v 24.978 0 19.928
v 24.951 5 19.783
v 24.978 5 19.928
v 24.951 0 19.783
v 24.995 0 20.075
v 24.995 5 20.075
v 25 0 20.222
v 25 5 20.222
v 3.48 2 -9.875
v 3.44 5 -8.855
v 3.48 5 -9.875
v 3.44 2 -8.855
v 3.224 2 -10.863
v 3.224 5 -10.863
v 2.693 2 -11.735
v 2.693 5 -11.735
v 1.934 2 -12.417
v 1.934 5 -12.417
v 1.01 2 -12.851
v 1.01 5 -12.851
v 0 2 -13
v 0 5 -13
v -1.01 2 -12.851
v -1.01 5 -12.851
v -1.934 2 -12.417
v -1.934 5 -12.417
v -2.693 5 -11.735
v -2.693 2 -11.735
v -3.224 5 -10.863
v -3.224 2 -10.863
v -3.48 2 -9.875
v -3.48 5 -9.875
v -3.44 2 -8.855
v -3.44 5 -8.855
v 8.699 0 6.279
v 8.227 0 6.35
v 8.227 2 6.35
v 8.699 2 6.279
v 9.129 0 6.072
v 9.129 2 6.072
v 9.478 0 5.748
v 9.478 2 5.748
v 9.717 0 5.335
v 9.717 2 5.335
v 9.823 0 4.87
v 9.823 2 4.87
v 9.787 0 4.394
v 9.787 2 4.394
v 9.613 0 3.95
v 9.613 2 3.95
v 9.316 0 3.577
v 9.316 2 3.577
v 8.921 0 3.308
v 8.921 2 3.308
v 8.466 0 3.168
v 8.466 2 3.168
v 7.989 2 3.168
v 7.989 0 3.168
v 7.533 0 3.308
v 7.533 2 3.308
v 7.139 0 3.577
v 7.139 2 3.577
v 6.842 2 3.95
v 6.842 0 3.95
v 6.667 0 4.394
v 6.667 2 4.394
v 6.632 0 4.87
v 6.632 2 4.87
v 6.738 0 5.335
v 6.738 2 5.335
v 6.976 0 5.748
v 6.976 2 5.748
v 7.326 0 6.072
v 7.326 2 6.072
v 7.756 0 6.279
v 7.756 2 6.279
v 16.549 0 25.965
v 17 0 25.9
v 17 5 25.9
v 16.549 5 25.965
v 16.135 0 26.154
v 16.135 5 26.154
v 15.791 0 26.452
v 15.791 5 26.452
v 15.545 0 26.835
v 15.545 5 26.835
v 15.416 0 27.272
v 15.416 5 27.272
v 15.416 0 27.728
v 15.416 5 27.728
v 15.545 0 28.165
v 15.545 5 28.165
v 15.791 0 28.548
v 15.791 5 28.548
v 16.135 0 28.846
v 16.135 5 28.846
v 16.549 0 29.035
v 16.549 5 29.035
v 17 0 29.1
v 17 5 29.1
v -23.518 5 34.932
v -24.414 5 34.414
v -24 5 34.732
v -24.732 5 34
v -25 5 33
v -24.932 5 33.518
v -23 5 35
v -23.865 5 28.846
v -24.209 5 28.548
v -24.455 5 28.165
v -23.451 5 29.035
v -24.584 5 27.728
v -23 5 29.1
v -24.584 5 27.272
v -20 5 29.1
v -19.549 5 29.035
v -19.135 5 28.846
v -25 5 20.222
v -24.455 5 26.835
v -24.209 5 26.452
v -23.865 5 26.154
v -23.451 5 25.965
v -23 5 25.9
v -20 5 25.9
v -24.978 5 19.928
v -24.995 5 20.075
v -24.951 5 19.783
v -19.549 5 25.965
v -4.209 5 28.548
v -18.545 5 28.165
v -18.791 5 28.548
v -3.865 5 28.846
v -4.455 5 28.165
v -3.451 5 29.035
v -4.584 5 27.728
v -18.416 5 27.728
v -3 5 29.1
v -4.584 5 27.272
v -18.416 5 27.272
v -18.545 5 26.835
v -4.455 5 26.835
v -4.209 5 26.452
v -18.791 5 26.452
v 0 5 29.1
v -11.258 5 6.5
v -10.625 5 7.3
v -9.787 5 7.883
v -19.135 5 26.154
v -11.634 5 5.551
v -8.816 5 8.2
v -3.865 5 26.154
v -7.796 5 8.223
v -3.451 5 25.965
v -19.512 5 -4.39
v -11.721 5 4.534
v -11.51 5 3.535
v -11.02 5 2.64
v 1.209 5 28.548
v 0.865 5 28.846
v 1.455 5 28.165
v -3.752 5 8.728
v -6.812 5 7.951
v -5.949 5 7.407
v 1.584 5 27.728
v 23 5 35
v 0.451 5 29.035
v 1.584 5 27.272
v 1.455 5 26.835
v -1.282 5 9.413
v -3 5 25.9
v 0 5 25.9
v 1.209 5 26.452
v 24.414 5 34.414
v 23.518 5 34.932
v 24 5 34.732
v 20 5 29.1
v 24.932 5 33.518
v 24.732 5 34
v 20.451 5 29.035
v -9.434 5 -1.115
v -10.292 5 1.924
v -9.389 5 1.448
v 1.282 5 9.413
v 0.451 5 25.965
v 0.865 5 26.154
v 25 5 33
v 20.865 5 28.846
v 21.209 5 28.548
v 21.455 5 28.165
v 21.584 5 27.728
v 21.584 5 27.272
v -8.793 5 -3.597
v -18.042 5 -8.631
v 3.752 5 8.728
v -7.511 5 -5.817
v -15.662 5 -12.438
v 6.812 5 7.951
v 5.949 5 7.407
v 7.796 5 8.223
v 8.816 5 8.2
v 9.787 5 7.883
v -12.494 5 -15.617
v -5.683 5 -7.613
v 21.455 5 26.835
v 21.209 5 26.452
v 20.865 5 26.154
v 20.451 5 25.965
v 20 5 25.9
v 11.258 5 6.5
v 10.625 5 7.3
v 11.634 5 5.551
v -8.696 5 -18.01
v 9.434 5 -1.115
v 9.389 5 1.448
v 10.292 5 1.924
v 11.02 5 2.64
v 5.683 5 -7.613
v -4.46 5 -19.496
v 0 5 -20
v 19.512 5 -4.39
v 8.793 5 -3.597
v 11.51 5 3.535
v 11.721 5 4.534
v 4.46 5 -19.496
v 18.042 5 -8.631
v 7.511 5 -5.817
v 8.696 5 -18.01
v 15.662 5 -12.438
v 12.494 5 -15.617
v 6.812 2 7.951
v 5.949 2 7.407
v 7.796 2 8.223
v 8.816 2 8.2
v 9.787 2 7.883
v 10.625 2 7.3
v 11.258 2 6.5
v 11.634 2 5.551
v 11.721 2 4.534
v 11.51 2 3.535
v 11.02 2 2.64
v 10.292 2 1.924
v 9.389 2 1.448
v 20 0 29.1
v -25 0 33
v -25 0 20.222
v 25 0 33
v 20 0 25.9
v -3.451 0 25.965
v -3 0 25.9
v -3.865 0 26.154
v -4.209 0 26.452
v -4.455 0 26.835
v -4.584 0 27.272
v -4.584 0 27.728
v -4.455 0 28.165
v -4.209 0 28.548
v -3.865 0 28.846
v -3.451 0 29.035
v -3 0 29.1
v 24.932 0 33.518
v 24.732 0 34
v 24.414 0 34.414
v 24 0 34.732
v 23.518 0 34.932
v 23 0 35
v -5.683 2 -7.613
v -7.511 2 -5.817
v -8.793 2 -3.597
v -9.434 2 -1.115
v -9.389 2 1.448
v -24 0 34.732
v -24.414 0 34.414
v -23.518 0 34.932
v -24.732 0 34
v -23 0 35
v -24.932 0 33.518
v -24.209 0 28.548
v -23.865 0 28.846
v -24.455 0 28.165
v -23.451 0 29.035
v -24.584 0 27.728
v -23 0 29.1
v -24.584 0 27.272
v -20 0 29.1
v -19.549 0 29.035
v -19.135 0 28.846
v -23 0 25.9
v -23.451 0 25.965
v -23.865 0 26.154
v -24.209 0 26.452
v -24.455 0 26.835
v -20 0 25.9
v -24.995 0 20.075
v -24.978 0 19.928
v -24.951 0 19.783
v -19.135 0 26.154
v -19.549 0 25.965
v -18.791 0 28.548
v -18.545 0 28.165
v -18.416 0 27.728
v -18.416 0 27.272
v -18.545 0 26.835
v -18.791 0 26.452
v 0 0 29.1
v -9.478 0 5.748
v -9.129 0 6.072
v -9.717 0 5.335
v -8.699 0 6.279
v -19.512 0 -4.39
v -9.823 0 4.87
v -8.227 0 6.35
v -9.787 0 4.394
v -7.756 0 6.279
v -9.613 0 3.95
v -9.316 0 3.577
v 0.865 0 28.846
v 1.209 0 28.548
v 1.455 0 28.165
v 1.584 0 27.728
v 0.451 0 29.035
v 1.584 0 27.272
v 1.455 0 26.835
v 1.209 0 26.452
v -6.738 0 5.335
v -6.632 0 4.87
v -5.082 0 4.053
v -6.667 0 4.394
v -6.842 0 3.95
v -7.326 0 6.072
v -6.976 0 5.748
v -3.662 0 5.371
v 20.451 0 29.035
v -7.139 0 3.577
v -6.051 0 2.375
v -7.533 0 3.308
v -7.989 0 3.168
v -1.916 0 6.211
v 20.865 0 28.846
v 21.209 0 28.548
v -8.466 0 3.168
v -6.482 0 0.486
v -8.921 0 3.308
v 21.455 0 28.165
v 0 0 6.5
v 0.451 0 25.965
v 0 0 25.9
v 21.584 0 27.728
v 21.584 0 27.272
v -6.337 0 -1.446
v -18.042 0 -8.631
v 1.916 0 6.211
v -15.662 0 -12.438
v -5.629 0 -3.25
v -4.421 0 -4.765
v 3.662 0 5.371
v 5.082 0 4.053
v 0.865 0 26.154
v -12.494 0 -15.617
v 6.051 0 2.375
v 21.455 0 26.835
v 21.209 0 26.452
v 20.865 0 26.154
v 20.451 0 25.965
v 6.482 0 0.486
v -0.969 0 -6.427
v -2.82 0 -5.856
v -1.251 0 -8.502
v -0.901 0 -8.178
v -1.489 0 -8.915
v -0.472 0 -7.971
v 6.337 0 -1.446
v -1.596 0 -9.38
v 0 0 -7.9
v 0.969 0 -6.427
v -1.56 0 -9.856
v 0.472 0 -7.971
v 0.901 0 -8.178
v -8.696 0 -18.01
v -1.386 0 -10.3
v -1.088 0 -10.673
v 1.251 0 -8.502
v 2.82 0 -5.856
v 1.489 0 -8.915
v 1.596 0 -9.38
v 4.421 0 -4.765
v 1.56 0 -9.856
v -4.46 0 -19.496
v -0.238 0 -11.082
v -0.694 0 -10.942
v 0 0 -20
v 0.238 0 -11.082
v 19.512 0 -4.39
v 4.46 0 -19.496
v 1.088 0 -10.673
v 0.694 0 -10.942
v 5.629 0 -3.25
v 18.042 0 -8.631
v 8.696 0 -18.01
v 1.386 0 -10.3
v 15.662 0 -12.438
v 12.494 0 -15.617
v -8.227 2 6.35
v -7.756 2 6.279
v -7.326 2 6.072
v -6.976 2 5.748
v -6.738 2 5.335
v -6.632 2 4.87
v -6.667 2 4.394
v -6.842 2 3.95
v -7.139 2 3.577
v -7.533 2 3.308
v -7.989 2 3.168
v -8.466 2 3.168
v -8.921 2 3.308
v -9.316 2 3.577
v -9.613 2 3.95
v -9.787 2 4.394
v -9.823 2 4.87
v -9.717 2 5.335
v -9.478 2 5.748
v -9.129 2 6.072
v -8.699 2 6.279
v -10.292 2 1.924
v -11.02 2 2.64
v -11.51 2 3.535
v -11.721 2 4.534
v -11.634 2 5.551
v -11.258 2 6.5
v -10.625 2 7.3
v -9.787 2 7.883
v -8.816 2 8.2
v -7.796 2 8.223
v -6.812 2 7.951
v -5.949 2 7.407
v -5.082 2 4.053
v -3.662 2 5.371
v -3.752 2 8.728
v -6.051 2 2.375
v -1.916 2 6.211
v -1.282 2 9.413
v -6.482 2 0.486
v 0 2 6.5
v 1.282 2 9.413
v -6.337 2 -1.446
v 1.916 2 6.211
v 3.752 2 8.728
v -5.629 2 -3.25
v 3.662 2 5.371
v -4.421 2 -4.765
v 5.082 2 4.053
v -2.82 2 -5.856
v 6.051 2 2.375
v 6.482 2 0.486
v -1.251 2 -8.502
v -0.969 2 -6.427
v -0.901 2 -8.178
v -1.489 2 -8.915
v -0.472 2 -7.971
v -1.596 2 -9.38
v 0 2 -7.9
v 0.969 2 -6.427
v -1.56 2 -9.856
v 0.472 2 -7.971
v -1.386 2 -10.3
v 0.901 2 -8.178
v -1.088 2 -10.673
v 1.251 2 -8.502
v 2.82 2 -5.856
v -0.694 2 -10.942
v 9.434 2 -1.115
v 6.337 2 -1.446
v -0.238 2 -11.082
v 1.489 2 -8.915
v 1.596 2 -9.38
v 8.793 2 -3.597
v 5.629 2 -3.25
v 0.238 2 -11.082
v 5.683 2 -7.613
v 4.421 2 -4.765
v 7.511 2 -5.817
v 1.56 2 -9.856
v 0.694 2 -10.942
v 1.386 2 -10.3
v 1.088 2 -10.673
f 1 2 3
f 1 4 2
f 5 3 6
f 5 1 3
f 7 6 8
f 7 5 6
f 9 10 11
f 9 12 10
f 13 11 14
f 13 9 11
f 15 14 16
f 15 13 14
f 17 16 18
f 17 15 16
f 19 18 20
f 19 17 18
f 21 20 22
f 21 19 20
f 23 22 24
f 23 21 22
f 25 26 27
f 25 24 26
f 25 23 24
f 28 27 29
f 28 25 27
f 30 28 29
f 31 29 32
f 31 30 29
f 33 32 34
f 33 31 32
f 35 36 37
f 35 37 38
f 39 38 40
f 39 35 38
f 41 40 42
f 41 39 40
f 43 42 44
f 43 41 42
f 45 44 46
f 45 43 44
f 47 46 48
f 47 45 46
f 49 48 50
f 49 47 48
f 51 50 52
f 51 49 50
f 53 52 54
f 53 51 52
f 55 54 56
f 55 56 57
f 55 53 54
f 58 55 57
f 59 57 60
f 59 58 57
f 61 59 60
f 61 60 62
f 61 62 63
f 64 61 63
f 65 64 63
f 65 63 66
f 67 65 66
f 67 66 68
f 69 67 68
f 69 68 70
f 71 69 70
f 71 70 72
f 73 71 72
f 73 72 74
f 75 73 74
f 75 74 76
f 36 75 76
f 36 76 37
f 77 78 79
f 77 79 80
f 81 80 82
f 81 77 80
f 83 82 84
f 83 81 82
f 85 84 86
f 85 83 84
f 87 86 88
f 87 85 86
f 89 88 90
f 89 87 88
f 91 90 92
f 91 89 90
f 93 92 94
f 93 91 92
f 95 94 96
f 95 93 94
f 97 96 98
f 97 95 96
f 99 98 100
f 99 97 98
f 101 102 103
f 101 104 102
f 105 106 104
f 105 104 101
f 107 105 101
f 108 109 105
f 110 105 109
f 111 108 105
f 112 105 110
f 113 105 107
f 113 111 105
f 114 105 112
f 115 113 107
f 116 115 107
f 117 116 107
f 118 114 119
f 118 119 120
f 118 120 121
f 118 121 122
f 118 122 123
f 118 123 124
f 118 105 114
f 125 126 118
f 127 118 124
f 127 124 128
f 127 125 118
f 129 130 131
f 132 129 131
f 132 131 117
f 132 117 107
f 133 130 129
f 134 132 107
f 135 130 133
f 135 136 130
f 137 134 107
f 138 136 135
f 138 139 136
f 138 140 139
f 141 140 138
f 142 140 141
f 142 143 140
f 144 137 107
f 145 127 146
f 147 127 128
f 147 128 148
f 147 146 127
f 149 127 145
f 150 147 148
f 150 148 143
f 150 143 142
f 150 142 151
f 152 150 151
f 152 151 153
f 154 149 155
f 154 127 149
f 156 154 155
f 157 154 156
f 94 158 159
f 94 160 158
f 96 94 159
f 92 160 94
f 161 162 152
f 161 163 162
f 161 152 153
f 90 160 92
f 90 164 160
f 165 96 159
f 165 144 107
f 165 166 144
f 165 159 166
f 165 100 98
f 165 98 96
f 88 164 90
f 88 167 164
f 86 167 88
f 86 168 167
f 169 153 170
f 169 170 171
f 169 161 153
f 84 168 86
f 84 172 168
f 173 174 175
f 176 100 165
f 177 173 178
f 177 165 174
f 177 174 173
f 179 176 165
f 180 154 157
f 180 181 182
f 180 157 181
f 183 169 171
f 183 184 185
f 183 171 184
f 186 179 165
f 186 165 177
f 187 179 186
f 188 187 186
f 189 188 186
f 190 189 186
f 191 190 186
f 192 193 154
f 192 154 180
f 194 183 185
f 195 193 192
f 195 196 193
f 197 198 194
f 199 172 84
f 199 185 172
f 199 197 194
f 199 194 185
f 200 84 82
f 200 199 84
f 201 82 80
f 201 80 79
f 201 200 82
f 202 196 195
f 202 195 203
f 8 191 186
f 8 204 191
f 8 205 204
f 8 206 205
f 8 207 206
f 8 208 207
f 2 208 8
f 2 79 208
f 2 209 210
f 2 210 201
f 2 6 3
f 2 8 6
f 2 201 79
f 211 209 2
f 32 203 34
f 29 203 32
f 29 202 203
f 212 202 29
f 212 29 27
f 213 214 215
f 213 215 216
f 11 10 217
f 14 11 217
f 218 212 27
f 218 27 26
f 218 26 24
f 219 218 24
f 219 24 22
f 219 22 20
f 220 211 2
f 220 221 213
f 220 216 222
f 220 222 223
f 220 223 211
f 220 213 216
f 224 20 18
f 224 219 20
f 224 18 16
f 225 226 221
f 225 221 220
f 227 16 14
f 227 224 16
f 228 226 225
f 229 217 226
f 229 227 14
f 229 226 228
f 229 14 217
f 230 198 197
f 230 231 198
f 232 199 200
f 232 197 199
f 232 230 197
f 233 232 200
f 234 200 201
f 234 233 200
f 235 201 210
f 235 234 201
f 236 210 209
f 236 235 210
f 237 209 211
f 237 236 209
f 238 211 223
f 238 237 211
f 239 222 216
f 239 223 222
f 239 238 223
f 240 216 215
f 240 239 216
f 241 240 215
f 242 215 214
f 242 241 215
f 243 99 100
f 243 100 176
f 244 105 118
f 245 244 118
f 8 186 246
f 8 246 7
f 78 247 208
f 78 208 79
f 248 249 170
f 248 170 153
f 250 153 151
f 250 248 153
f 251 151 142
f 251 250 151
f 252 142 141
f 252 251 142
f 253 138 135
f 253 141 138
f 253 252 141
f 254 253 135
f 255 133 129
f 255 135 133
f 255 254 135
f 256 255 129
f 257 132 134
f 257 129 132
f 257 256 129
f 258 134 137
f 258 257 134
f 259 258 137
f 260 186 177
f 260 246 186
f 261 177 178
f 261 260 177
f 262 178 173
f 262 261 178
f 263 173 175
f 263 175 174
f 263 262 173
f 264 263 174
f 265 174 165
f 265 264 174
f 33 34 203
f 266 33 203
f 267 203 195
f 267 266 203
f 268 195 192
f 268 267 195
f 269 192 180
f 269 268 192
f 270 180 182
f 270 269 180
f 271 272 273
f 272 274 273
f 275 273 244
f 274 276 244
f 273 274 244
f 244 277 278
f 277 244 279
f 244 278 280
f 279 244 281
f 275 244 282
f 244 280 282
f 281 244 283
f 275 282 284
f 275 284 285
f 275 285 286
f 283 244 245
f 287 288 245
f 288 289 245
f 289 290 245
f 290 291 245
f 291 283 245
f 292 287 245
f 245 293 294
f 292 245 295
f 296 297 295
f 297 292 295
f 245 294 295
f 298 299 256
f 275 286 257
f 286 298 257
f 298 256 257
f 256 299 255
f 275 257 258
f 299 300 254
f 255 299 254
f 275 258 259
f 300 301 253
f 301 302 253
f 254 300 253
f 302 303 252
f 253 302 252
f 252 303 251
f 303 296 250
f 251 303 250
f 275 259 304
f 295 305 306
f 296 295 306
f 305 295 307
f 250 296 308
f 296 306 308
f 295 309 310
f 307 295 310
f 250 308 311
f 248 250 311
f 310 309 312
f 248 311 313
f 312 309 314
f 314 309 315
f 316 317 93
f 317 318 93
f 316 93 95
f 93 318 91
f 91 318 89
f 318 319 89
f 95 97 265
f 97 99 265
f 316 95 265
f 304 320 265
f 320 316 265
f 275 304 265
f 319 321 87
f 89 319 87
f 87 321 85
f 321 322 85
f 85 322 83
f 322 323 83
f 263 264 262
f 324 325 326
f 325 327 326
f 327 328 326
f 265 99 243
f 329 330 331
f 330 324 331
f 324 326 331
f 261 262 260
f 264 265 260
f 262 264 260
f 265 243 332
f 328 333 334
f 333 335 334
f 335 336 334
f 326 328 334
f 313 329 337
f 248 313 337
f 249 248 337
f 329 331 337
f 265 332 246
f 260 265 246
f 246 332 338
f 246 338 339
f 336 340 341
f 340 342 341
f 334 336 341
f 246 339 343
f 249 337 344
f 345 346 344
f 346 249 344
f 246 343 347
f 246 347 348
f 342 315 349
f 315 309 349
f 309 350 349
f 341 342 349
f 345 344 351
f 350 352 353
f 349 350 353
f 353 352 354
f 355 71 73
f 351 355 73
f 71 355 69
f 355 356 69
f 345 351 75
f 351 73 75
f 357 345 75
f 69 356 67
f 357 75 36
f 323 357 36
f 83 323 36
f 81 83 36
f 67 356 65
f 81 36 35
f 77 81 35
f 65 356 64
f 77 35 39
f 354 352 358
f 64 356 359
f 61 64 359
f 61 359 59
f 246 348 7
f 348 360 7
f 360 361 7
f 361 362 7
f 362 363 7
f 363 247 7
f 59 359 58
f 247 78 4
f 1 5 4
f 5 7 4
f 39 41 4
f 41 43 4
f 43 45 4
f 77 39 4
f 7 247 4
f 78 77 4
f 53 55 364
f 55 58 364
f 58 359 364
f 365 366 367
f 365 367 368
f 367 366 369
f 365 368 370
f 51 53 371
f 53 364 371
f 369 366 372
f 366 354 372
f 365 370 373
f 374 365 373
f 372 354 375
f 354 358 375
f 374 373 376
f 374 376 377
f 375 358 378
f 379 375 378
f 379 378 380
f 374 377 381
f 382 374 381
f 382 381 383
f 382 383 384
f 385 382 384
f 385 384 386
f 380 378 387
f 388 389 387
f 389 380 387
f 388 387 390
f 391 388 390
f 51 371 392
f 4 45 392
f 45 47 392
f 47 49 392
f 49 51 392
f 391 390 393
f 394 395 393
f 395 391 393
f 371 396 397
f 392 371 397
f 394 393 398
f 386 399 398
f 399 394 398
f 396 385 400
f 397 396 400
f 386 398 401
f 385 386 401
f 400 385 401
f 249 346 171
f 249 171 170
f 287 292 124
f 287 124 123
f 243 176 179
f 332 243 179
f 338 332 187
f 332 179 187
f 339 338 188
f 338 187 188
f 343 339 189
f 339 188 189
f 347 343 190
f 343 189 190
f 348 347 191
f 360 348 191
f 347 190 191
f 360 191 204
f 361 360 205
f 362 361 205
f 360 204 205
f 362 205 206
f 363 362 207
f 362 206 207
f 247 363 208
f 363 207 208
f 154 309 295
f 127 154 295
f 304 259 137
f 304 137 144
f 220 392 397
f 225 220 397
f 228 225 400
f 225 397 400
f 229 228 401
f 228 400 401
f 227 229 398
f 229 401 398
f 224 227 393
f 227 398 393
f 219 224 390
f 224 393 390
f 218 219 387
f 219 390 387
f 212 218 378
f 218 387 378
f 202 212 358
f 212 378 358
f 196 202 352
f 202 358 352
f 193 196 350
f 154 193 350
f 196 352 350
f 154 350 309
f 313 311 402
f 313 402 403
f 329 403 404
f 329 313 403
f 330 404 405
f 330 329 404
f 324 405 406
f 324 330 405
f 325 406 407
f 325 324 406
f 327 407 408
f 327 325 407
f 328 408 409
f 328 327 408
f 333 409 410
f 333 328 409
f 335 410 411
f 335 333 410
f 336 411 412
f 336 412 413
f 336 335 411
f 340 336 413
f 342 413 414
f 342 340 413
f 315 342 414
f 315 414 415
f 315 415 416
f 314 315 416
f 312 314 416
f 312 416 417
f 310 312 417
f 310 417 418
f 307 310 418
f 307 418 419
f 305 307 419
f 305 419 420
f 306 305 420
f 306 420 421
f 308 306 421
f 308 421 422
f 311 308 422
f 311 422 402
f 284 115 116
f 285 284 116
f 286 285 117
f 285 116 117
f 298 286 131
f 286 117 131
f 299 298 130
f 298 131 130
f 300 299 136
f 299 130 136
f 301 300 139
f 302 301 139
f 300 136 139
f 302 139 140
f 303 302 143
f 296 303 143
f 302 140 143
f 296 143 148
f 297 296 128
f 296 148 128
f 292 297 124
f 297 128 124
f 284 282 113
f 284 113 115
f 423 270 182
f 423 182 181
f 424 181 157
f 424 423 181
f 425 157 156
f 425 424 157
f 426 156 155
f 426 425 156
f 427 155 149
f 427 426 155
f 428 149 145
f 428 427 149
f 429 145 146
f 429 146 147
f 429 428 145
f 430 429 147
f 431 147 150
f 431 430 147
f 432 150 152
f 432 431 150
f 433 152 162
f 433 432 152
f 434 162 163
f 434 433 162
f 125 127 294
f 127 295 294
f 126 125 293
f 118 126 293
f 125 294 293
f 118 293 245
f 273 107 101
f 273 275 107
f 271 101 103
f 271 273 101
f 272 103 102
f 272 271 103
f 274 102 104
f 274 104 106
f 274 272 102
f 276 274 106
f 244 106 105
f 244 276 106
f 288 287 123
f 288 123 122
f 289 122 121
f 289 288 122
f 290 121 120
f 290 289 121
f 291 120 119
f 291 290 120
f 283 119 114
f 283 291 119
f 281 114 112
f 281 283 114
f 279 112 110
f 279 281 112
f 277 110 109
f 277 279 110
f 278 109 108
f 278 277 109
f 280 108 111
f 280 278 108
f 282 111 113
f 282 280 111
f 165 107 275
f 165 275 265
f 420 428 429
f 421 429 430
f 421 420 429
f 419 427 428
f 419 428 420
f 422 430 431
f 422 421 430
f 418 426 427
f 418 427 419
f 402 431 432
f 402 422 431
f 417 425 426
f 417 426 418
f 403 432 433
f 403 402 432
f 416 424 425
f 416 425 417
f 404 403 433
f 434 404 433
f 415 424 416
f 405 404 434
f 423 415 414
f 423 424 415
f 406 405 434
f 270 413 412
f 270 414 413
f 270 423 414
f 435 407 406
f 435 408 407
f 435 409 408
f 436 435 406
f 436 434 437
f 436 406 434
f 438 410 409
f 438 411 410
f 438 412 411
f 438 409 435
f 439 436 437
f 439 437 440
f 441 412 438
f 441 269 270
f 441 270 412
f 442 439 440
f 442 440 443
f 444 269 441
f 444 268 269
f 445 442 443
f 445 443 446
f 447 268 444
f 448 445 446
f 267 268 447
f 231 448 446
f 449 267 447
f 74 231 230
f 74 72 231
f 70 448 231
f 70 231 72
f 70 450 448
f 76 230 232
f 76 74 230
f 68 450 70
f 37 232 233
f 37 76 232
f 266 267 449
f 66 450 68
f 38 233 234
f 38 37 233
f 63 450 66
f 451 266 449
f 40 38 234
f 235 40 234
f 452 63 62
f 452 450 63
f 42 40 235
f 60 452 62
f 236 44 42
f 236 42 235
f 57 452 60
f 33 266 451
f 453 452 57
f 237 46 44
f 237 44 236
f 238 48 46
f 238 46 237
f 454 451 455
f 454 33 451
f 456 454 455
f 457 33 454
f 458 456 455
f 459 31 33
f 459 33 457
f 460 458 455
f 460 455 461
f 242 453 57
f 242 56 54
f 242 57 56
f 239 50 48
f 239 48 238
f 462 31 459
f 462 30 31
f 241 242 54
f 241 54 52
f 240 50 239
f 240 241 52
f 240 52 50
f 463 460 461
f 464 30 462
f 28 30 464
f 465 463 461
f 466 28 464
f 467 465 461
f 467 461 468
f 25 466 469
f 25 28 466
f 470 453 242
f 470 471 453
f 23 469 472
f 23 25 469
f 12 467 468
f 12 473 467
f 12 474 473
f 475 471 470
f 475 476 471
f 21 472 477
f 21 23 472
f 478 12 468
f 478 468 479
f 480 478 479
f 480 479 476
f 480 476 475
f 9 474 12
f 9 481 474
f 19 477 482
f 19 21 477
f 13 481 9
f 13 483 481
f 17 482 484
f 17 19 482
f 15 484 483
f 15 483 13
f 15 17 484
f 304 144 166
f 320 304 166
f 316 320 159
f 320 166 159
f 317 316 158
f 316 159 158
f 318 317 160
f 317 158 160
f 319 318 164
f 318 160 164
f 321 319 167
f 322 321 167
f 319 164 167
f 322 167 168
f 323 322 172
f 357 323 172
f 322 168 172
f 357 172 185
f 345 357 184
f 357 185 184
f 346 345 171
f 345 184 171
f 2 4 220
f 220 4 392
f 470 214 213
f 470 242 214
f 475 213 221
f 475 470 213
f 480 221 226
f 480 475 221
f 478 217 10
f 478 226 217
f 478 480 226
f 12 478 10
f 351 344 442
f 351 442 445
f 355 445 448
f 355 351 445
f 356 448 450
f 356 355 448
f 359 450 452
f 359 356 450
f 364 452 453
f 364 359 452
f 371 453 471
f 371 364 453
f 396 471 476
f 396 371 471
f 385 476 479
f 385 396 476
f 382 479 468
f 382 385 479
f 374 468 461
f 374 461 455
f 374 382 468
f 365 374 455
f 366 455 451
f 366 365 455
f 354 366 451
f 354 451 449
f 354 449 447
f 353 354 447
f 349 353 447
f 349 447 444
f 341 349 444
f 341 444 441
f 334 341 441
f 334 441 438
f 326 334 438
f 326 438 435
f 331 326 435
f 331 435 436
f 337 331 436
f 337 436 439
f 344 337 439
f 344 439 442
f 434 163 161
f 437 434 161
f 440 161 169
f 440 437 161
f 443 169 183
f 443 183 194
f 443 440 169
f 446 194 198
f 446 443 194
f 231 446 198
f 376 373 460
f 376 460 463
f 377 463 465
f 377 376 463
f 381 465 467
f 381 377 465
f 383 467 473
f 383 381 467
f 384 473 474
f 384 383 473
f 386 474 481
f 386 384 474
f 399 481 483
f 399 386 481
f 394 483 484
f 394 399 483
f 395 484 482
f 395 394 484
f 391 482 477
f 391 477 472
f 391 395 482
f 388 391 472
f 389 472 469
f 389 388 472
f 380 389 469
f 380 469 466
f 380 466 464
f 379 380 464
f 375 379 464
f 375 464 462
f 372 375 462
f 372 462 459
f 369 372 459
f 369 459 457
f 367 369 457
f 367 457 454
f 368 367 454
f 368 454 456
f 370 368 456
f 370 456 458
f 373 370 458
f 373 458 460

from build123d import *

# Parameters (mm, degrees)
SKETCH_1_R          = 20
SKETCH_1_R_2        = 6.5
SKETCH_1_R_3        = 1.6
EXTRUDE_1_DEPTH     = 5
SKETCH_2_W          = 50
SKETCH_2_H          = 15
SKETCH_2_R          = 1.6
EXTRUDE_2_DEPTH     = 5
EXTRUDE_START       = -5
EXTRUDE_4_DEPTH     = 5
CUT_EXTRUDE_START   = -3
SKETCH_5_R          = 9.5
SKETCH_5_R_2        = 3.5
SKETCH_5_R_3        = 1.6
SKETCH_5_R_4        = 6.5
CUT_EXTRUDE_1_DEPTH = 3
FILLET_1_R          = 2
CUT_EXTRUDE_2_DEPTH = 44.301270189


with BuildPart() as part:
    # 草图1 → 凸台-拉伸1 (new body)
    with BuildSketch(Plane(origin=(0, 0, 0), x_dir=(1, 0, 0), z_dir=(0, 1, 0))):
        with Locations(Location((0, 0, 0), (0, 0, 270))):
            Circle(SKETCH_1_R)
        with Locations(Location((0, 0, 0), (0, 0, 270))):
            Circle(SKETCH_1_R_2, mode=Mode.SUBTRACT)
        with Locations(Location((0, 9.5, 0), (0, 0, 270))):
            Circle(SKETCH_1_R_3, mode=Mode.SUBTRACT)
        with Locations(Location((8.227241336, -4.75, 0), (0, 0, 270))):
            Circle(SKETCH_1_R_3, mode=Mode.SUBTRACT)
        with Locations(Location((-8.227241336, -4.75, 0), (0, 0, 270))):
            Circle(SKETCH_1_R_3, mode=Mode.SUBTRACT)
    extrude(amount=EXTRUDE_1_DEPTH)



with BuildPart() as body_2:
    # 草图2 → 凸台-拉伸2 (new body)
    with BuildSketch(Plane(origin=(0, 5, 0), x_dir=(1, 0, 0), z_dir=(0, 1, 0))):
        with Locations((0, -27.5)):
            Rectangle(SKETCH_2_W, SKETCH_2_H)
        with Locations(Location((-20, -27.5, 0), (0, 0, 270))):
            Circle(SKETCH_2_R, mode=Mode.SUBTRACT)
        with Locations(Location((20, -27.5, 0), (0, 0, 270))):
            Circle(SKETCH_2_R, mode=Mode.SUBTRACT)
        with Locations(Location((0, -27.5, 0), (0, 0, 270))):
            Circle(SKETCH_2_R, mode=Mode.SUBTRACT)
    extrude(amount=-EXTRUDE_2_DEPTH)


with BuildPart() as part_1:
    add(part.part)

    add(body_2.part)  # 凸台-拉伸4 merges body 2
    # 草图4 → 凸台-拉伸4 (add)
    with BuildSketch(Plane(origin=(0, 5, 0), x_dir=(1, 0, 0), z_dir=(0, 1, 0)).offset(EXTRUDE_START)):
        with BuildLine():
            Line((-19.512195122, 4.390243902), (-25, -20))
            Line((-25, -20), (0, -20))
            ThreePointArc((0, -20), (-15.617376189, -12.493900951), (-19.512195122, 4.390243902))
        make_face()
        with BuildLine():
            ThreePointArc((20, 0), (14.142135624, -14.142135624), (0, -20))
            Line((0, -20), (25, -20))
            Line((25, -20), (19.512195122, 4.390243902))
            ThreePointArc((19.512195122, 4.390243902), (19.877674693, 2.208630521), (20, 0))
        make_face()
    extrude(amount=EXTRUDE_4_DEPTH)

    # 草图5 → 切除-拉伸1 (cut)
    # profile 1 of 25: a face of its own
    with BuildSketch(Plane(origin=(0, 5, 0), x_dir=(1, 0, 0), z_dir=(0, 1, 0)).offset(CUT_EXTRUDE_START)):
        Circle(SKETCH_5_R)
    # profile 2 of 25: a face of its own
    with BuildSketch(Plane(origin=(0, 5, 0), x_dir=(1, 0, 0), z_dir=(0, 1, 0)).offset(CUT_EXTRUDE_START)):
        with Locations((-8.227241336, -4.75)):
            Circle(SKETCH_5_R_2)
        with Locations(Location((-8.227241336, -4.75, 0), (0, 0, 270))):
            Circle(SKETCH_5_R_3, mode=Mode.SUBTRACT)
    # profile 3 of 25: a face of its own
    with BuildSketch(Plane(origin=(0, 5, 0), x_dir=(1, 0, 0), z_dir=(0, 1, 0)).offset(CUT_EXTRUDE_START)):
        with Locations((-8.227241336, -4.75)):
            Circle(SKETCH_5_R_2)
        with Locations(Location((-8.227241336, -4.75, 0), (0, 0, 270))):
            Circle(SKETCH_5_R_3, mode=Mode.SUBTRACT)
    # profile 4 of 25: a face of its own
    with BuildSketch(Plane(origin=(0, 5, 0), x_dir=(1, 0, 0), z_dir=(0, 1, 0)).offset(CUT_EXTRUDE_START)):
        Circle(SKETCH_5_R)
        with Locations(Location((0, 0, 0), (0, 0, 270))):
            Circle(SKETCH_5_R_4, mode=Mode.SUBTRACT)
    # profile 5 of 25: a face of its own
    with BuildSketch(Plane(origin=(0, 5, 0), x_dir=(1, 0, 0), z_dir=(0, 1, 0)).offset(CUT_EXTRUDE_START)):
        with Locations((-8.227241336, -4.75)):
            Circle(SKETCH_5_R_2)
    # profile 6 of 25: a face of its own
    with BuildSketch(Plane(origin=(0, 5, 0), x_dir=(1, 0, 0), z_dir=(0, 1, 0)).offset(CUT_EXTRUDE_START)):
        with Locations((0, 9.5)):
            Circle(SKETCH_5_R_2)
    # profile 7 of 25: a face of its own
    with BuildSketch(Plane(origin=(0, 5, 0), x_dir=(1, 0, 0), z_dir=(0, 1, 0)).offset(CUT_EXTRUDE_START)):
        Circle(SKETCH_5_R)
        with Locations(Location((0, 0, 0), (0, 0, 270))):
            Circle(SKETCH_5_R_4, mode=Mode.SUBTRACT)
    # profile 8 of 25: a face of its own
    with BuildSketch(Plane(origin=(0, 5, 0), x_dir=(1, 0, 0), z_dir=(0, 1, 0)).offset(CUT_EXTRUDE_START)):
        with Locations((-8.227241336, -4.75)):
            Circle(SKETCH_5_R_2)
    # profile 9 of 25: a face of its own
    with BuildSketch(Plane(origin=(0, 5, 0), x_dir=(1, 0, 0), z_dir=(0, 1, 0)).offset(CUT_EXTRUDE_START)):
        with Locations((0, 9.5)):
            Circle(SKETCH_5_R_2)
        with Locations(Location((0, 9.5, 0), (0, 0, 270))):
            Circle(SKETCH_5_R_3, mode=Mode.SUBTRACT)
    # profile 10 of 25: a face of its own
    with BuildSketch(Plane(origin=(0, 5, 0), x_dir=(1, 0, 0), z_dir=(0, 1, 0)).offset(CUT_EXTRUDE_START)):
        Circle(SKETCH_5_R)
        with Locations(Location((0, 0, 0), (0, 0, 270))):
            Circle(SKETCH_5_R_4, mode=Mode.SUBTRACT)
    # profile 11 of 25: a face of its own
    with BuildSketch(Plane(origin=(0, 5, 0), x_dir=(1, 0, 0), z_dir=(0, 1, 0)).offset(CUT_EXTRUDE_START)):
        Circle(SKETCH_5_R)
    # profile 12 of 25: a face of its own
    with BuildSketch(Plane(origin=(0, 5, 0), x_dir=(1, 0, 0), z_dir=(0, 1, 0)).offset(CUT_EXTRUDE_START)):
        with Locations((0, 9.5)):
            Circle(SKETCH_5_R_2)
        with Locations(Location((0, 9.5, 0), (0, 0, 270))):
            Circle(SKETCH_5_R_3, mode=Mode.SUBTRACT)
    # profile 13 of 25: a face of its own
    with BuildSketch(Plane(origin=(0, 5, 0), x_dir=(1, 0, 0), z_dir=(0, 1, 0)).offset(CUT_EXTRUDE_START)):
        Circle(SKETCH_5_R)
    # profile 14 of 25: a face of its own
    with BuildSketch(Plane(origin=(0, 5, 0), x_dir=(1, 0, 0), z_dir=(0, 1, 0)).offset(CUT_EXTRUDE_START)):
        with Locations((8.227241336, -4.75)):
            Circle(SKETCH_5_R_2)
        with Locations(Location((8.227241336, -4.75, 0), (0, 0, 270))):
            Circle(SKETCH_5_R_3, mode=Mode.SUBTRACT)
    # profile 15 of 25: a face of its own
    with BuildSketch(Plane(origin=(0, 5, 0), x_dir=(1, 0, 0), z_dir=(0, 1, 0)).offset(CUT_EXTRUDE_START)):
        with Locations((8.227241336, -4.75)):
            Circle(SKETCH_5_R_2)
        with Locations(Location((8.227241336, -4.75, 0), (0, 0, 270))):
            Circle(SKETCH_5_R_3, mode=Mode.SUBTRACT)
    # profile 16 of 25: a face of its own
    with BuildSketch(Plane(origin=(0, 5, 0), x_dir=(1, 0, 0), z_dir=(0, 1, 0)).offset(CUT_EXTRUDE_START)):
        Circle(SKETCH_5_R)
        with Locations(Location((0, 0, 0), (0, 0, 270))):
            Circle(SKETCH_5_R_4, mode=Mode.SUBTRACT)
    # profile 17 of 25: a face of its own
    with BuildSketch(Plane(origin=(0, 5, 0), x_dir=(1, 0, 0), z_dir=(0, 1, 0)).offset(CUT_EXTRUDE_START)):
        with Locations((8.227241336, -4.75)):
            Circle(SKETCH_5_R_2)
    # profile 18 of 25: a face of its own
    with BuildSketch(Plane(origin=(0, 5, 0), x_dir=(1, 0, 0), z_dir=(0, 1, 0)).offset(CUT_EXTRUDE_START)):
        Circle(SKETCH_5_R)
        with Locations(Location((0, 0, 0), (0, 0, 270))):
            Circle(SKETCH_5_R_4, mode=Mode.SUBTRACT)
    # profile 19 of 25: a face of its own
    with BuildSketch(Plane(origin=(0, 5, 0), x_dir=(1, 0, 0), z_dir=(0, 1, 0)).offset(CUT_EXTRUDE_START)):
        with Locations((0, 9.5)):
            Circle(SKETCH_5_R_2)
    # profile 20 of 25: a face of its own
    with BuildSketch(Plane(origin=(0, 5, 0), x_dir=(1, 0, 0), z_dir=(0, 1, 0)).offset(CUT_EXTRUDE_START)):
        with Locations((-8.227241336, -4.75)):
            Circle(SKETCH_5_R_2)
    # profile 21 of 25: a face of its own
    with BuildSketch(Plane(origin=(0, 5, 0), x_dir=(1, 0, 0), z_dir=(0, 1, 0)).offset(CUT_EXTRUDE_START)):
        Circle(SKETCH_5_R)
        with Locations(Location((0, 0, 0), (0, 0, 270))):
            Circle(SKETCH_5_R_4, mode=Mode.SUBTRACT)
    # profile 22 of 25: a face of its own
    with BuildSketch(Plane(origin=(0, 5, 0), x_dir=(1, 0, 0), z_dir=(0, 1, 0)).offset(CUT_EXTRUDE_START)):
        with Locations(Location((0, 0, 0), (0, 0, 270))):
            Circle(SKETCH_5_R_4)
    # profile 23 of 25: a face of its own
    with BuildSketch(Plane(origin=(0, 5, 0), x_dir=(1, 0, 0), z_dir=(0, 1, 0)).offset(CUT_EXTRUDE_START)):
        with Locations((8.227241336, -4.75)):
            Circle(SKETCH_5_R_2)
    # profile 24 of 25: a face of its own
    with BuildSketch(Plane(origin=(0, 5, 0), x_dir=(1, 0, 0), z_dir=(0, 1, 0)).offset(CUT_EXTRUDE_START)):
        with Locations((8.227241336, -4.75)):
            Circle(SKETCH_5_R_2)
    # profile 25 of 25: a face of its own
    with BuildSketch(Plane(origin=(0, 5, 0), x_dir=(1, 0, 0), z_dir=(0, 1, 0)).offset(CUT_EXTRUDE_START)):
        with Locations(Location((0, 0, 0), (0, 0, 270))):
            Circle(SKETCH_5_R_4)
    extrude(amount=CUT_EXTRUDE_1_DEPTH, mode=Mode.SUBTRACT)

    # 圆角1
    fillet_1_edges = [part_1.edges().sort_by_distance(p)[0] for p in [
        (-25, 2.5, 20),
        (25, 2.5, 20),
        (25, 2.5, 35),
        (-25, 2.5, 35),
    ]]
    fillet(fillet_1_edges, radius=FILLET_1_R)

    # 草图6 → 切除-拉伸2 (cut, through all)
    with BuildSketch(Plane.XZ):
        with BuildLine():
            Line((20, 25.9), (17, 25.9))
            ThreePointArc((17, 25.9), (15.4, 27.5), (17, 29.1))
            Line((17, 29.1), (20, 29.1))
            ThreePointArc((20, 29.1), (21.6, 27.5), (20, 25.9))
        make_face()
        with BuildLine():
            Line((0, 25.9), (-3, 25.9))
            ThreePointArc((-3, 25.9), (-4.6, 27.5), (-3, 29.1))
            Line((-3, 29.1), (0, 29.1))
            ThreePointArc((0, 29.1), (1.6, 27.5), (0, 25.9))
        make_face()
        with BuildLine():
            Line((-20, 25.9), (-23, 25.9))
            ThreePointArc((-23, 25.9), (-24.6, 27.5), (-23, 29.1))
            Line((-23, 29.1), (-20, 29.1))
            ThreePointArc((-20, 29.1), (-18.4, 27.5), (-20, 25.9))
        make_face()
    extrude(amount=-CUT_EXTRUDE_2_DEPTH, mode=Mode.SUBTRACT)


solid = part_1.part
